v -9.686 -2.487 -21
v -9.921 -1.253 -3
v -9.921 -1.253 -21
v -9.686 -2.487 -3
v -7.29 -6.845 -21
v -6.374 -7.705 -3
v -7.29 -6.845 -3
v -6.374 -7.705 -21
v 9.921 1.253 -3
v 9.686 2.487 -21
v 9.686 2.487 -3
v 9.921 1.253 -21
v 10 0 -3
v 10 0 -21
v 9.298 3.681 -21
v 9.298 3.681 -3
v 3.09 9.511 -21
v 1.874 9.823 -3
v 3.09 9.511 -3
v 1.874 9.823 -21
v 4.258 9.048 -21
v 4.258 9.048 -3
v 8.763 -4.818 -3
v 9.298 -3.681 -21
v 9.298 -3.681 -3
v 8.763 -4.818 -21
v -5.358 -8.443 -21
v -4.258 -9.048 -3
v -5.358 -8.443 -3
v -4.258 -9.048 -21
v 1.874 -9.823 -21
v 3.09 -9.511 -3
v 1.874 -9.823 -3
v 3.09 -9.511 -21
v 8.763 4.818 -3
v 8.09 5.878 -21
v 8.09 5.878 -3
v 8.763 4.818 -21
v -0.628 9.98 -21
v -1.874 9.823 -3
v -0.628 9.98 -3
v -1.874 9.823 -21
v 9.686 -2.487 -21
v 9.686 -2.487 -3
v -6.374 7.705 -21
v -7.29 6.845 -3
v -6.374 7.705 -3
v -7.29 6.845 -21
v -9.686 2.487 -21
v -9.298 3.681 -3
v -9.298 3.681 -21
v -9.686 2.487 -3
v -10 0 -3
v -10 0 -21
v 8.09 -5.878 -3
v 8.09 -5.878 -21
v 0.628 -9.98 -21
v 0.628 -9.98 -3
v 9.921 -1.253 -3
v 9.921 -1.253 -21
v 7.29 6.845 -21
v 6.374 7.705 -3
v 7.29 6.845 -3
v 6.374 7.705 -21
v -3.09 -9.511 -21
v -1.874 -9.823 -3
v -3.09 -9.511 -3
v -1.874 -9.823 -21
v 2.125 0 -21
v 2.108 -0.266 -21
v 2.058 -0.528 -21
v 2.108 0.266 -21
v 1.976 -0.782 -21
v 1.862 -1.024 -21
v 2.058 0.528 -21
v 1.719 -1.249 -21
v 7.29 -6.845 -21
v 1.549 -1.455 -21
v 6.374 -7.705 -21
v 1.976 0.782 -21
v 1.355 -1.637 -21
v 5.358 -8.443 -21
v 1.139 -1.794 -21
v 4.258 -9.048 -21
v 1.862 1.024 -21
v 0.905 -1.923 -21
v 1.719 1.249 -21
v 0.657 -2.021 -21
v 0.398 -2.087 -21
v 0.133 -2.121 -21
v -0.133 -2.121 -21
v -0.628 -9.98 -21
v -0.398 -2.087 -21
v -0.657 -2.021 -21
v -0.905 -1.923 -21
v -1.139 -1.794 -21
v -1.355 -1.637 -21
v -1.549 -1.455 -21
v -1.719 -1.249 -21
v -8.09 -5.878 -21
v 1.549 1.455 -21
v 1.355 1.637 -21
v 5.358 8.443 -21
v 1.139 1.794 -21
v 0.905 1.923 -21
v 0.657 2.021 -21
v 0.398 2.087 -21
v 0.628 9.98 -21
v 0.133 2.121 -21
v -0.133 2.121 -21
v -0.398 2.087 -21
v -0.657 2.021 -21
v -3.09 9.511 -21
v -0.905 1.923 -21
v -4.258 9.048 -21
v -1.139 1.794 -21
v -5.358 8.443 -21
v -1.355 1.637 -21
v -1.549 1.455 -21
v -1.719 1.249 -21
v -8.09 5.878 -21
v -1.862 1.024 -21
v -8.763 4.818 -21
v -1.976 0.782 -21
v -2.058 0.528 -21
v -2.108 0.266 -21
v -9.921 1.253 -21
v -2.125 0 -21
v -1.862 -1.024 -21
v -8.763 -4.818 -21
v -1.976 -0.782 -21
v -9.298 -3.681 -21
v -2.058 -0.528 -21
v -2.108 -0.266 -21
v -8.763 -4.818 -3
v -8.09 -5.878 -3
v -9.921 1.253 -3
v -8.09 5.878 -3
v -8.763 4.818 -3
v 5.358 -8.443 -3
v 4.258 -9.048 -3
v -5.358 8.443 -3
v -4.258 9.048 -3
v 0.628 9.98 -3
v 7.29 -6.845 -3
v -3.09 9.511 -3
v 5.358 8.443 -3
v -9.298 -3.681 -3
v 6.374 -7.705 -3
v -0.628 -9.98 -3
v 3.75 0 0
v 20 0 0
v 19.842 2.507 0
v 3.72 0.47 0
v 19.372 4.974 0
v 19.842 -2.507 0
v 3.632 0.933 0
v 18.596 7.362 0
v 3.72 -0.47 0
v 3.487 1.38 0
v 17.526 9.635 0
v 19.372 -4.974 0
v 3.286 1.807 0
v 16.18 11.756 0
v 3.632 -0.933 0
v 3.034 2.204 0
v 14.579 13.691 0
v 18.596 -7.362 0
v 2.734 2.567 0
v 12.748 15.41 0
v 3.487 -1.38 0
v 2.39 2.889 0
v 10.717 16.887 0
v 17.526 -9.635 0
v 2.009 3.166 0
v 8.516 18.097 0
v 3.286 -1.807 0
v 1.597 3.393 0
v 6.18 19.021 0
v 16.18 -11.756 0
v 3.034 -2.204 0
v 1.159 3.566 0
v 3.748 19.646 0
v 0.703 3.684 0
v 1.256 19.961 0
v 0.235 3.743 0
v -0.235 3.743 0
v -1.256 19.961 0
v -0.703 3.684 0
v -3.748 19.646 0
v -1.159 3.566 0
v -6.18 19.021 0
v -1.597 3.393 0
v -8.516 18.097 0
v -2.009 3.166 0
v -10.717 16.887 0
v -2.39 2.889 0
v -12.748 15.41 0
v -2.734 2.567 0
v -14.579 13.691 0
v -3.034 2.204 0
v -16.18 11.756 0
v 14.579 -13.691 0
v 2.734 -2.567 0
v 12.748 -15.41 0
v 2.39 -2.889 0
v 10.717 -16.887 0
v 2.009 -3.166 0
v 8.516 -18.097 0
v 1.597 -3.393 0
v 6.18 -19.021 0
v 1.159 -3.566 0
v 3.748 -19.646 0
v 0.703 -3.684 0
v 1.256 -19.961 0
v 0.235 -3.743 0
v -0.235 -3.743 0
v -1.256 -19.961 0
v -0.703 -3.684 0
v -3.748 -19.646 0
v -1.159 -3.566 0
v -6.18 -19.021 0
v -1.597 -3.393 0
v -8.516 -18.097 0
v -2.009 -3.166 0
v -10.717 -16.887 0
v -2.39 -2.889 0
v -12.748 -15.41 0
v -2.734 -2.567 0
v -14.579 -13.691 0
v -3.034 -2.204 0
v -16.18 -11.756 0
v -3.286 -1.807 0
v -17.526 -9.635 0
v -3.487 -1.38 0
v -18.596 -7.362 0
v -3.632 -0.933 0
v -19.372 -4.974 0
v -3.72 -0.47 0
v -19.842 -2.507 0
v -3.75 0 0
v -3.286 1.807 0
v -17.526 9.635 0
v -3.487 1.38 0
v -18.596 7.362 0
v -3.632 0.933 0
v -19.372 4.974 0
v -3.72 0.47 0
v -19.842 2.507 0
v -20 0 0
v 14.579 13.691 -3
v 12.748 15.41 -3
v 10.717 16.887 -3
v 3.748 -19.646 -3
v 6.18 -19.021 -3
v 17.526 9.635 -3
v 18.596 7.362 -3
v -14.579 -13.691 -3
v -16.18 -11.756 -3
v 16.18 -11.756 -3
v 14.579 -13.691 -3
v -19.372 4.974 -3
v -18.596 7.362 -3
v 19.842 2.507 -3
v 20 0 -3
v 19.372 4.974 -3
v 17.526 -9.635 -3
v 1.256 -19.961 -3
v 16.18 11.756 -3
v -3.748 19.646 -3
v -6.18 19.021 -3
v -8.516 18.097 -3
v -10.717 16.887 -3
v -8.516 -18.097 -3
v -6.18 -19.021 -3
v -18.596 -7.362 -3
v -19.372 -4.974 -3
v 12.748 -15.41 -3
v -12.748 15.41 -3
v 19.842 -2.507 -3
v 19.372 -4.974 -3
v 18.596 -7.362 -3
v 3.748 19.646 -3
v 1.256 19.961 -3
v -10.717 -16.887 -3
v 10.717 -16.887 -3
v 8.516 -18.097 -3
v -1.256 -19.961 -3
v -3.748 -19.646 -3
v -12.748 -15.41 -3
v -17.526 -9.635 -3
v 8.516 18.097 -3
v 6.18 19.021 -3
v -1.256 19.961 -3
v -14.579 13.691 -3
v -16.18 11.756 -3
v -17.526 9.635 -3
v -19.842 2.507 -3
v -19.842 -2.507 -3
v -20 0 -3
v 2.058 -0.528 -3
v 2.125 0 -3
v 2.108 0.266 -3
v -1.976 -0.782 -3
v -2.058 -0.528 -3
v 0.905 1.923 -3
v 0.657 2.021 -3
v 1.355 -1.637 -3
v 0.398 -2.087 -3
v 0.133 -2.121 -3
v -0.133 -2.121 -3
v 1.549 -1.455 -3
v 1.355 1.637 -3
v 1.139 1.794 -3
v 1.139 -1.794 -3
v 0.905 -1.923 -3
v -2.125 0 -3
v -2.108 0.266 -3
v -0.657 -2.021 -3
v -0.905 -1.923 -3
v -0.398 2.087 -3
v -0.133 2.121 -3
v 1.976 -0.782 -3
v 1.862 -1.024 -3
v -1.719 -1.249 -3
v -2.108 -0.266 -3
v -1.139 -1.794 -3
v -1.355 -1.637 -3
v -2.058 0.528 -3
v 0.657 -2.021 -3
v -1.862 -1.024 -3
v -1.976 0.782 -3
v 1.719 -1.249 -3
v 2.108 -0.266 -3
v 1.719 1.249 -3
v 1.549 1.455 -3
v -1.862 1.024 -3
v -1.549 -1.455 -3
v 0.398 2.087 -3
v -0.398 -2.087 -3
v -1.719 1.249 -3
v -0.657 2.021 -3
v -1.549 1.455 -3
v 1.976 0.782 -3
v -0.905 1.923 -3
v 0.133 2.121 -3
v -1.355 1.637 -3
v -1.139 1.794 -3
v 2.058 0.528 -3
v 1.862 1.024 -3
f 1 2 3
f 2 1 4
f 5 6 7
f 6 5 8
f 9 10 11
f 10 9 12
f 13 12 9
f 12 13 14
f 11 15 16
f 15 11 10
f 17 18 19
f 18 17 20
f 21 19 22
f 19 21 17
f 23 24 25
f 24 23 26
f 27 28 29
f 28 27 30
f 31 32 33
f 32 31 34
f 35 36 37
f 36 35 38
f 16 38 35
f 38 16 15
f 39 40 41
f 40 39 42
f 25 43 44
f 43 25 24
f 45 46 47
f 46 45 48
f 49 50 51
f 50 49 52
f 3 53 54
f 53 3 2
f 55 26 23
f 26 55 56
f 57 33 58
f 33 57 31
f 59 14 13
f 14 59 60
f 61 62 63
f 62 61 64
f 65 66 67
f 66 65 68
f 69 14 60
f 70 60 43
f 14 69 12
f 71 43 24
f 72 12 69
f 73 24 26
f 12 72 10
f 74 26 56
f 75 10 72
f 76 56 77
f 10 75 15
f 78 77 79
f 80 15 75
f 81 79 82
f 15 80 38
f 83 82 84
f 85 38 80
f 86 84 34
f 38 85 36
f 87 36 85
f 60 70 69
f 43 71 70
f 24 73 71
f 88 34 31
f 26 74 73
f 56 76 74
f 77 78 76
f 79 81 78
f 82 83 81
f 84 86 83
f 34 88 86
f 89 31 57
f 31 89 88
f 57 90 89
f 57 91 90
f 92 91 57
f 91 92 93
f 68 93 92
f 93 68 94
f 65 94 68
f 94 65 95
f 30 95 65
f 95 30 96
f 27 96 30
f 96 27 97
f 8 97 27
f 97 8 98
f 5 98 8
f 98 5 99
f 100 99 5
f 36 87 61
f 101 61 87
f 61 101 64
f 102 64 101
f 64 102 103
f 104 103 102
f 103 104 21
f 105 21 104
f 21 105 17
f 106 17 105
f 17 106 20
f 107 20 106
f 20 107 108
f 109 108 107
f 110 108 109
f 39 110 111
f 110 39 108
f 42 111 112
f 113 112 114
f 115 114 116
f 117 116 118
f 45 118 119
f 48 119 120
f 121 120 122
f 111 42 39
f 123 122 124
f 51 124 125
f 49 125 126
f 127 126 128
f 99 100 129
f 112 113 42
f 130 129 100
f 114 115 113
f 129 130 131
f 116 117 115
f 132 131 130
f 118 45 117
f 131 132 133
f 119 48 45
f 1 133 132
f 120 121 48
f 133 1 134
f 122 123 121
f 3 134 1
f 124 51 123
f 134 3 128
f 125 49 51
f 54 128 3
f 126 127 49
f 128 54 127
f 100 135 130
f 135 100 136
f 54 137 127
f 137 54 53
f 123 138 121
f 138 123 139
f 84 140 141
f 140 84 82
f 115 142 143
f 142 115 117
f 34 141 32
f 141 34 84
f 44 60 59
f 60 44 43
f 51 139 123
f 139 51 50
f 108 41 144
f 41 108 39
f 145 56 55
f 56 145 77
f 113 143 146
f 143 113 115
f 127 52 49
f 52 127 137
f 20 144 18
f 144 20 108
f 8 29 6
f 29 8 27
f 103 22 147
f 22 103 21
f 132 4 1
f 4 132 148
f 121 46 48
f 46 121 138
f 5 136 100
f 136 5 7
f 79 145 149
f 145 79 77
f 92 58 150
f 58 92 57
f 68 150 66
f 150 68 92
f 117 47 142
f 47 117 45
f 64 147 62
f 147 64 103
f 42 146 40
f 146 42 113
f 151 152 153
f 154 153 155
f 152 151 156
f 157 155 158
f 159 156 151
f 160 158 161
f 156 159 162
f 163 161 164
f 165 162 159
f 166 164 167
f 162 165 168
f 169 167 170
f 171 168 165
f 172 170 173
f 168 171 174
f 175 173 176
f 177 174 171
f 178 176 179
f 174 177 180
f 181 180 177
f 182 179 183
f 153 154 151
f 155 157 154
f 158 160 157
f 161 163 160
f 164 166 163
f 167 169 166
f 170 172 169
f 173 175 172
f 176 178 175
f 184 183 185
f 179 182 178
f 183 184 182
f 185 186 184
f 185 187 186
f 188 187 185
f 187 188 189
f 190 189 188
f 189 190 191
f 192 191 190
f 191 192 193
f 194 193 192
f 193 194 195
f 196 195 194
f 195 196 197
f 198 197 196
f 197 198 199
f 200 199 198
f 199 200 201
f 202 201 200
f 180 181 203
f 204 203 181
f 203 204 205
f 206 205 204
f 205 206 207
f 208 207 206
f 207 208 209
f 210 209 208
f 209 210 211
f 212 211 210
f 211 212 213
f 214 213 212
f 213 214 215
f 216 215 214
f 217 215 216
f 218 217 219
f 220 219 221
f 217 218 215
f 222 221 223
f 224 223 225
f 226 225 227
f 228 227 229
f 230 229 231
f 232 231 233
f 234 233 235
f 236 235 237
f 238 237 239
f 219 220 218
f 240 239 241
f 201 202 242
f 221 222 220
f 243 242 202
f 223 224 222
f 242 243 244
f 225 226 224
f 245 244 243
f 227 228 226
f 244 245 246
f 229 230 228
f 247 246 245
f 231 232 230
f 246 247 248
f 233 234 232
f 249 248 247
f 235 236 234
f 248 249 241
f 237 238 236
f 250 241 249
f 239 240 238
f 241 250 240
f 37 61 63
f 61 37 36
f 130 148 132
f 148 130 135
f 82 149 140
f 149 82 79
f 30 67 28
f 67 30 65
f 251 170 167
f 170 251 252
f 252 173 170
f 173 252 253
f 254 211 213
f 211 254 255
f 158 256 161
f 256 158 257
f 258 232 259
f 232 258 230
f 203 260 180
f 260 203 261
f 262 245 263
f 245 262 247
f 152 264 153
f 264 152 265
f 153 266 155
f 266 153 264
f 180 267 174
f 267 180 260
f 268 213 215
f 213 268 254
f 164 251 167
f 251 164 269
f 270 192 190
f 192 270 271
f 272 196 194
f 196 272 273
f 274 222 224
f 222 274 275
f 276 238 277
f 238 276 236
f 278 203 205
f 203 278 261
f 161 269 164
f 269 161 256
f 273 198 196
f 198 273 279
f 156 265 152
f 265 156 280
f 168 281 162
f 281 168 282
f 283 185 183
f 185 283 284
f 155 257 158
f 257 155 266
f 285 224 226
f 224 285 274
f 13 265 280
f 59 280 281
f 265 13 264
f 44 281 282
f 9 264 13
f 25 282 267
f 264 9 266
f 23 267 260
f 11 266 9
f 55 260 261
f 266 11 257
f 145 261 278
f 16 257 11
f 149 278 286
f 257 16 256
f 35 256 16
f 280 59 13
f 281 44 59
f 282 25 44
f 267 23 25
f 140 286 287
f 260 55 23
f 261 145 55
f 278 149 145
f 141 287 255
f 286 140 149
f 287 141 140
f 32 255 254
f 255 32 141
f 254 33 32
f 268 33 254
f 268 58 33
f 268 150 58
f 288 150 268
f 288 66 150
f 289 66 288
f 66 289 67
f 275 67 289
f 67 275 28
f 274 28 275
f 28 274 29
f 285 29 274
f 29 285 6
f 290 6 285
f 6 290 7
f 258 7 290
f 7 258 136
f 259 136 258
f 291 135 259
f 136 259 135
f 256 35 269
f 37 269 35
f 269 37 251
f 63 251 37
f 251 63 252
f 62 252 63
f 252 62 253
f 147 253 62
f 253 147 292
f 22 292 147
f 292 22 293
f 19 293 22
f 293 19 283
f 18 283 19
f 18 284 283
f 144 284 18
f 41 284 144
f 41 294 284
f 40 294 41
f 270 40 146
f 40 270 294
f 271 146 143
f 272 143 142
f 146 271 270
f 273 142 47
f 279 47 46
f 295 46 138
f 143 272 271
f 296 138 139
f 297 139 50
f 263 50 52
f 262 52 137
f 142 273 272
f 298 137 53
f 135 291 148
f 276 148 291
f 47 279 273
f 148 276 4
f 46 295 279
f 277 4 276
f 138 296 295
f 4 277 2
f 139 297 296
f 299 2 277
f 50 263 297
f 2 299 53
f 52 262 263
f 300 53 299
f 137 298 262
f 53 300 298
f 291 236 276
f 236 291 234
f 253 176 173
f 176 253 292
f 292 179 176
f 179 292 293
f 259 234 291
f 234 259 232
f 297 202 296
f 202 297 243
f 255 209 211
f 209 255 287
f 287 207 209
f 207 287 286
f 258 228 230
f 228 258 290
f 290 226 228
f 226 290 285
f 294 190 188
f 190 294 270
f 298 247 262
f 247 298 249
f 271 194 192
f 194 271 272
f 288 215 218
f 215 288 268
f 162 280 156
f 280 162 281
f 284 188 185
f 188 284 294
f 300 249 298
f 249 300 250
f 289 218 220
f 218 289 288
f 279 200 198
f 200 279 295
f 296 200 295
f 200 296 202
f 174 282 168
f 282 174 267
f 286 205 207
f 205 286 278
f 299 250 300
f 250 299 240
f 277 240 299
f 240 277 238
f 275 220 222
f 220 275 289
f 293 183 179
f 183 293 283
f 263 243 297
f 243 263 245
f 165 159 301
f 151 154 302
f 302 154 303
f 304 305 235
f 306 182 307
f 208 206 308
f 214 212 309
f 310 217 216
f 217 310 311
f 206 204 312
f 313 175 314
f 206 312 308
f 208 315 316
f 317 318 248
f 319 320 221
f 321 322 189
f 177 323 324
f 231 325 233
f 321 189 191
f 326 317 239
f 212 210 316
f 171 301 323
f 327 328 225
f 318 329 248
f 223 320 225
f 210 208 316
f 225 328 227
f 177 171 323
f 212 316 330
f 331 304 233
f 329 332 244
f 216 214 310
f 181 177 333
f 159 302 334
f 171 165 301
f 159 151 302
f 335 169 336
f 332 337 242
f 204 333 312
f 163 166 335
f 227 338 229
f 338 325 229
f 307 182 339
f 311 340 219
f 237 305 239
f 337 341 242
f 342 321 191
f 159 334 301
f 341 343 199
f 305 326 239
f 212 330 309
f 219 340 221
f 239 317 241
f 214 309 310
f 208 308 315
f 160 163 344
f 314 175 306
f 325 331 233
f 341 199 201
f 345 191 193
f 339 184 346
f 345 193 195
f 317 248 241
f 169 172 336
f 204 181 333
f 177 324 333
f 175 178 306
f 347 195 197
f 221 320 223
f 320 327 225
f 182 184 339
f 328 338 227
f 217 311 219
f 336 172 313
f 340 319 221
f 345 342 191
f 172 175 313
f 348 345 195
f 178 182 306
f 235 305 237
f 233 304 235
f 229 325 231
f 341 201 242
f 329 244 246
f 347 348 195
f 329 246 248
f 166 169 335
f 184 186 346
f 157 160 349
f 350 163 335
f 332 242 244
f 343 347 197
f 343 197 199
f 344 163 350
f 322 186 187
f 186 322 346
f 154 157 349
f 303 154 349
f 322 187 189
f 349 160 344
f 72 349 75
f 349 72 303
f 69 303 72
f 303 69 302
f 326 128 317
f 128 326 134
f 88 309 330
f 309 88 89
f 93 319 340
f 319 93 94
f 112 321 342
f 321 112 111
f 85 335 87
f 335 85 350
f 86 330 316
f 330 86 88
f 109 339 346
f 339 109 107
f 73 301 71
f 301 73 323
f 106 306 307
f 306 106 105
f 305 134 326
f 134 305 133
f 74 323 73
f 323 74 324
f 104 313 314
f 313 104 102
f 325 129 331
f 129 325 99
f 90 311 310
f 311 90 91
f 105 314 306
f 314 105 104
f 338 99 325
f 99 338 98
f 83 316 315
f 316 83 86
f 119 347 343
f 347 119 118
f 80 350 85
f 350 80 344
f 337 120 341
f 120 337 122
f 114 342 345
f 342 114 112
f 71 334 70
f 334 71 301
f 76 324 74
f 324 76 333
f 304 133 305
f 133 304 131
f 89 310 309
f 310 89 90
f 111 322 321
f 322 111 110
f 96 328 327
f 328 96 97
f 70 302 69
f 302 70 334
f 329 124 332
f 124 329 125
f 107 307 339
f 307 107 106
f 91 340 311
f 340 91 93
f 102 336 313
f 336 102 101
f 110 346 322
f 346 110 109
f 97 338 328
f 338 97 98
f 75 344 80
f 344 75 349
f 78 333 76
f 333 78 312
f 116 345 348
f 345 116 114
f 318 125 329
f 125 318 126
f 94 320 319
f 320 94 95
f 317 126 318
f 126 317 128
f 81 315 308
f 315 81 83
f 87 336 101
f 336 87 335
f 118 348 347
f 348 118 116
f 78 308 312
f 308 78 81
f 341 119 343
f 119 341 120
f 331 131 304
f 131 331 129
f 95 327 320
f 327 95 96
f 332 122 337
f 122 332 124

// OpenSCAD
$fn = 50;


difference() {
	union() {
		translate(v = [0, 0, -21.0000000000]) {
			cylinder(h = 21, r = 10.0000000000);
		}
		translate(v = [0, 0, -3.0000000000]) {
			cylinder(h = 3, r = 20.0000000000);
		}
	}
	union() {
		translate(v = [0, 0, 0]) {
			rotate(a = [0, 0, 0]) {
				difference() {
					union() {
						#translate(v = [0, 0, -21.0000000000]) {
							cylinder(h = 21, r = 2.0000000000);
						}
						#translate(v = [0, 0, -3]) {
							cylinder(h = 3, r1 = 2.1250000000, r2 = 3.7500000000);
						}
						#translate(v = [0, 0, -21.0000000000]) {
							cylinder(h = 21, r = 2.1250000000);
						}
						#translate(v = [0, 0, -21.0000000000]) {
							cylinder(h = 21, r = 2.0000000000);
						}
					}
					union();
				}
			}
		}
	}
}
